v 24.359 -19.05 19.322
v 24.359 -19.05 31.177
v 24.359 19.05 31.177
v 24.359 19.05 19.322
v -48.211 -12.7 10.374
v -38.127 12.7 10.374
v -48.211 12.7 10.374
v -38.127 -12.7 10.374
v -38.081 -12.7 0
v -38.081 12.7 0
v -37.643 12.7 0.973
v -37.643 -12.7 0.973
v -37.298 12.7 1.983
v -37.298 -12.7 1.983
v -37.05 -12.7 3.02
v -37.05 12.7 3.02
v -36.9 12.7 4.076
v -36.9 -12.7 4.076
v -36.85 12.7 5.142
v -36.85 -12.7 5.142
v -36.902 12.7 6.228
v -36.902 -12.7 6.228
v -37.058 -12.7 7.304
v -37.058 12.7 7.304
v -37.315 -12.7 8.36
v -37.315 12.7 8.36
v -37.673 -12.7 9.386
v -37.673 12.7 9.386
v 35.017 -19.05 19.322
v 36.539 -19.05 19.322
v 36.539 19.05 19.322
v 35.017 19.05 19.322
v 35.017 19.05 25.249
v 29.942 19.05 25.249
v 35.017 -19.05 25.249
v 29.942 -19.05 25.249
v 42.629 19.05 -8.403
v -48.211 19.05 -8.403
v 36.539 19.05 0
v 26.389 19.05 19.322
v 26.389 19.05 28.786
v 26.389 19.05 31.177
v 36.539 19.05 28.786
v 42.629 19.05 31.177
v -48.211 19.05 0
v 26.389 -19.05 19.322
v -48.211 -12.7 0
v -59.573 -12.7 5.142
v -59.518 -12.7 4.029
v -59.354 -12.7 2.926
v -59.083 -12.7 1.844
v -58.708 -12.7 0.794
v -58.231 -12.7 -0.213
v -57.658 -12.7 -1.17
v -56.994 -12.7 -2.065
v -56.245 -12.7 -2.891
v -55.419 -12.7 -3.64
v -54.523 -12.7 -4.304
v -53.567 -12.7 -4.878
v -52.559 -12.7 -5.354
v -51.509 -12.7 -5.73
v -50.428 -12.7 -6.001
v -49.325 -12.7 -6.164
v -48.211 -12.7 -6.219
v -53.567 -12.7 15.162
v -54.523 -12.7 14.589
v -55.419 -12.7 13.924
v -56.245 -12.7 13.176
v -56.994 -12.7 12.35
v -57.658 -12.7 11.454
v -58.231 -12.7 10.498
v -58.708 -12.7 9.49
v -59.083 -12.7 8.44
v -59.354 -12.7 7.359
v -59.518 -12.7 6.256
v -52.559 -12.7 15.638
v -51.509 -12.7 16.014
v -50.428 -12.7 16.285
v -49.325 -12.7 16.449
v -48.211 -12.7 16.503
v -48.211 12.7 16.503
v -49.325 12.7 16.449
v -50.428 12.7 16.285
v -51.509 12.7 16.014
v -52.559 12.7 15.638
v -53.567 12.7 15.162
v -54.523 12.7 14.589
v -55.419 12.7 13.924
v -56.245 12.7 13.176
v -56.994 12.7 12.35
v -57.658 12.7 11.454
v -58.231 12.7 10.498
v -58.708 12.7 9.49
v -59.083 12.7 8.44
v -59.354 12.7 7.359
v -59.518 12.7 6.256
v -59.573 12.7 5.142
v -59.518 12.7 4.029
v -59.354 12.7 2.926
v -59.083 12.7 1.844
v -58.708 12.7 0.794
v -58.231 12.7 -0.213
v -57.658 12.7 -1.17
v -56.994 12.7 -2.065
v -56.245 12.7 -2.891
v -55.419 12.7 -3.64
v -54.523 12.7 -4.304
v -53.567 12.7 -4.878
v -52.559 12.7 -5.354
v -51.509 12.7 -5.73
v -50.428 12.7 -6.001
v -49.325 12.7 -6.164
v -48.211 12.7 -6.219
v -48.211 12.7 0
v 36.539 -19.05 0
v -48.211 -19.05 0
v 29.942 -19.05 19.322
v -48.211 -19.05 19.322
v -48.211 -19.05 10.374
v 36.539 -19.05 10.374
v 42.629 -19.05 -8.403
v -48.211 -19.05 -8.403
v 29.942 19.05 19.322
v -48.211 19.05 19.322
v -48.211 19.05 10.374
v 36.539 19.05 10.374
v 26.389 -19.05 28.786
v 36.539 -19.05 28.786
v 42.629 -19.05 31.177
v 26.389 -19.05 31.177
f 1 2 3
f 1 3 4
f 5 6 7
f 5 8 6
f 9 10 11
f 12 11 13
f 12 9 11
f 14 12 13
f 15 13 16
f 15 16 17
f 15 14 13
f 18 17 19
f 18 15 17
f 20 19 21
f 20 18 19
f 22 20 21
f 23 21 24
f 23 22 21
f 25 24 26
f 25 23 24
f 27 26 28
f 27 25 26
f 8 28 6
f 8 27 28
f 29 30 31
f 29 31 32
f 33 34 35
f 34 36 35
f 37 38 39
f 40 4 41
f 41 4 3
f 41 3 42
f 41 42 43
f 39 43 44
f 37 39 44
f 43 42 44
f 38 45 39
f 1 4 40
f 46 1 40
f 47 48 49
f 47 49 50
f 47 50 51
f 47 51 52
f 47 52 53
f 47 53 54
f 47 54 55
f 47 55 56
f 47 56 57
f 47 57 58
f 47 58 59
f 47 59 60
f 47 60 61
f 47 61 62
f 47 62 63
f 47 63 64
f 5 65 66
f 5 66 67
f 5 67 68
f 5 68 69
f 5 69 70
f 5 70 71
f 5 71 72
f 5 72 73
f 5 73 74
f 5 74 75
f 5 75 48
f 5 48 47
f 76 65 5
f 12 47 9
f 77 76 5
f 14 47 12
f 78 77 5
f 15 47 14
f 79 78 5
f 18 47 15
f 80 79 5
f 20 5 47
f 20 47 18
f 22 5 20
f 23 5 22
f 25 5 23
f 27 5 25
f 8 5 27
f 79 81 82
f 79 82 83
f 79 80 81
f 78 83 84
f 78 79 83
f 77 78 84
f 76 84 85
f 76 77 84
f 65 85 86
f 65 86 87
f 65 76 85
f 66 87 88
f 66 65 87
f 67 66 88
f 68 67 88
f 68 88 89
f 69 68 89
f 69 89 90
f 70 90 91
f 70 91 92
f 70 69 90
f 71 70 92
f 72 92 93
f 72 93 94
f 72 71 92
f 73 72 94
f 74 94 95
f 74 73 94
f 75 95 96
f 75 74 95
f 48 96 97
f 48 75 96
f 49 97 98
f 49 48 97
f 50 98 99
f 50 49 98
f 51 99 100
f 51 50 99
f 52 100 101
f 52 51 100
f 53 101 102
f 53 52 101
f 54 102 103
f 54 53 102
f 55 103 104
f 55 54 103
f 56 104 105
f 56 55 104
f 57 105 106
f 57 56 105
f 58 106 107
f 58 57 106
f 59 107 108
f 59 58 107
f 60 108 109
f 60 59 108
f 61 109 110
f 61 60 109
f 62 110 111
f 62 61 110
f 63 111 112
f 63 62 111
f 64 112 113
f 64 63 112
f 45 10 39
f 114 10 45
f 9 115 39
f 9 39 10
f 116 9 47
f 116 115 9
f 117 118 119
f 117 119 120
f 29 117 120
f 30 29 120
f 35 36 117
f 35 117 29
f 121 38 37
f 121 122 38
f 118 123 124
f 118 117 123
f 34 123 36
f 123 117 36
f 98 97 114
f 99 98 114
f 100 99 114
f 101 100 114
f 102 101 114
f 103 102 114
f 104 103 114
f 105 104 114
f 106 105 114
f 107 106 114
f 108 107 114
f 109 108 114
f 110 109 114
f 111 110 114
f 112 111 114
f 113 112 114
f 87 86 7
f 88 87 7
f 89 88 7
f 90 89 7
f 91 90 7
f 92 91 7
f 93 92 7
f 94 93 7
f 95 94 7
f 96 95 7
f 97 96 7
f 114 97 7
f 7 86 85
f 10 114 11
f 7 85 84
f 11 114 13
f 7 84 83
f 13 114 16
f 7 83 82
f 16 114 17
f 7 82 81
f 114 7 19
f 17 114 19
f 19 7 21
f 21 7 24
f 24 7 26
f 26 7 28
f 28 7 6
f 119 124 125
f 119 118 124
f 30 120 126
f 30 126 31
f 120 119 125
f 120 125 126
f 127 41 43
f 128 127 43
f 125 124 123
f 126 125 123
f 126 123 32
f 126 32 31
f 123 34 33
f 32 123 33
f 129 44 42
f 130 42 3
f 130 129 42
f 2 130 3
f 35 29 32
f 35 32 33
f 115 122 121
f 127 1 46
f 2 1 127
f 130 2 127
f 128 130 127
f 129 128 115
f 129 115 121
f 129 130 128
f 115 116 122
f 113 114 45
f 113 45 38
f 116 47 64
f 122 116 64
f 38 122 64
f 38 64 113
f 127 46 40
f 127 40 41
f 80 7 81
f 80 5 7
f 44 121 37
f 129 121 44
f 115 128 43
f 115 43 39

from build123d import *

# Parameters (mm, degrees)
F1_DEPTH = 12.7
F0_W     = 10.1497806609
F0_H     = 2.3909639567
F0_W_2   = 6.0898587108
F2_DEPTH = 19.05
F0_W_3   = 5.0748903304
F0_H_2   = 5.9276018292
F3_DEPTH = 19.05


with BuildPart() as f1:
    # F0 (on Front) → F1 (new body, symmetric)
    with BuildSketch(Plane.XZ):
        with BuildLine():
            ThreePointArc((-48.2114478946, 16.5032624805), (-59.5725855396, 5.1421248354), (-48.2114478946, -6.2190128097))
            Line((-48.2114478946, -6.2190128097), (-48.2114478946, 0))
            Line((-48.2114478946, 0), (-38.0806038642, 0))
            ThreePointArc((-38.0806038642, 0), (-37.1621637078, 2.49849711), (-36.8503102495, 5.1421248354))
            ThreePointArc((-36.8503102495, 5.1421248354), (-37.1740146519, 7.8348030569), (-38.1266817241, 10.3740403429))
            Line((-38.1266817241, 10.3740403429), (-48.2114478946, 10.3740403429))
            Line((-48.2114478946, 10.3740403429), (-48.2114478946, 16.5032624805))
        make_face()
    extrude(amount=F1_DEPTH, both=True)

    # F0 (on Front) → F2 (join, symmetric)
    with BuildSketch(Plane.XZ):
        with BuildLine():
            Line((-48.2114478946, -6.2190128097), (-48.2114478946, -8.4030567668))
            Line((-48.2114478946, -8.4030567668), (36.5392118692, -8.4030567668))
            Line((36.5392118692, -8.4030567668), (36.5392118692, 0))
            Line((36.5392118692, 0), (-38.0806038642, 0))
            ThreePointArc((-38.0806038642, 0), (-42.2677512104, -4.5402260319), (-48.2114478946, -6.2190128097))
        make_face()
        Polygon((36.5392118692, 0), (36.5392118692, -8.4030567668), (42.62907058, -8.4030567668), (42.62907058, 28.7860110402), (36.5392118692, 28.7860110402), (36.5392118692, 19.3217713386), (36.5392118692, 10.3740403429), align=None)
        with Locations((31.4643215388, 29.9814930186)):
            Rectangle(F0_W, F0_H)
        with Locations((39.5841412246, 29.9814930186)):
            Rectangle(F0_W_2, F0_H)
        Polygon((24.359472096, 31.1769749969), (24.359472096, 19.3217713386), (26.3894312084, 19.3217713386), (26.3894312084, 28.7860110402), (26.3894312084, 31.1769749969), align=None)
        with BuildLine():
            Line((-48.2114478946, 0), (-48.2114478946, -6.2190128097))
            ThreePointArc((-48.2114478946, -6.2190128097), (-42.2677512104, -4.5402260319), (-38.0806038642, 0))
            Line((-38.0806038642, 0), (-48.2114478946, 0))
        make_face()
    extrude(amount=F2_DEPTH, both=True)


with BuildPart() as f3:
    # F0 (on Front) → F3 (new body, symmetric)
    with BuildSketch(Plane.XZ):
        with BuildLine():
            Line((-48.2114478946, 19.3217713386), (-48.2114478946, 16.5032624805))
            ThreePointArc((-48.2114478946, 16.5032624805), (-42.3108150318, 14.8507797581), (-38.1266817241, 10.3740403429))
            Line((-38.1266817241, 10.3740403429), (36.5392118692, 10.3740403429))
            Line((36.5392118692, 10.3740403429), (36.5392118692, 19.3217713386))
            Line((36.5392118692, 19.3217713386), (35.0167416036, 19.3217713386))
            Line((35.0167416036, 19.3217713386), (29.9418512732, 19.3217713386))
            Line((29.9418512732, 19.3217713386), (26.3894312084, 19.3217713386))
            Line((26.3894312084, 19.3217713386), (24.359472096, 19.3217713386))
            Line((24.359472096, 19.3217713386), (-48.2114478946, 19.3217713386))
        make_face()
        with Locations((32.4792964384, 22.2855722532)):
            Rectangle(F0_W_3, F0_H_2)
        with BuildLine():
            ThreePointArc((-38.1266817241, 10.3740403429), (-42.3108150318, 14.8507797581), (-48.2114478946, 16.5032624805))
            Line((-48.2114478946, 16.5032624805), (-48.2114478946, 10.3740403429))
            Line((-48.2114478946, 10.3740403429), (-38.1266817241, 10.3740403429))
        make_face()
    extrude(amount=F3_DEPTH, both=True)


solid = Compound([f1.part, f3.part])
